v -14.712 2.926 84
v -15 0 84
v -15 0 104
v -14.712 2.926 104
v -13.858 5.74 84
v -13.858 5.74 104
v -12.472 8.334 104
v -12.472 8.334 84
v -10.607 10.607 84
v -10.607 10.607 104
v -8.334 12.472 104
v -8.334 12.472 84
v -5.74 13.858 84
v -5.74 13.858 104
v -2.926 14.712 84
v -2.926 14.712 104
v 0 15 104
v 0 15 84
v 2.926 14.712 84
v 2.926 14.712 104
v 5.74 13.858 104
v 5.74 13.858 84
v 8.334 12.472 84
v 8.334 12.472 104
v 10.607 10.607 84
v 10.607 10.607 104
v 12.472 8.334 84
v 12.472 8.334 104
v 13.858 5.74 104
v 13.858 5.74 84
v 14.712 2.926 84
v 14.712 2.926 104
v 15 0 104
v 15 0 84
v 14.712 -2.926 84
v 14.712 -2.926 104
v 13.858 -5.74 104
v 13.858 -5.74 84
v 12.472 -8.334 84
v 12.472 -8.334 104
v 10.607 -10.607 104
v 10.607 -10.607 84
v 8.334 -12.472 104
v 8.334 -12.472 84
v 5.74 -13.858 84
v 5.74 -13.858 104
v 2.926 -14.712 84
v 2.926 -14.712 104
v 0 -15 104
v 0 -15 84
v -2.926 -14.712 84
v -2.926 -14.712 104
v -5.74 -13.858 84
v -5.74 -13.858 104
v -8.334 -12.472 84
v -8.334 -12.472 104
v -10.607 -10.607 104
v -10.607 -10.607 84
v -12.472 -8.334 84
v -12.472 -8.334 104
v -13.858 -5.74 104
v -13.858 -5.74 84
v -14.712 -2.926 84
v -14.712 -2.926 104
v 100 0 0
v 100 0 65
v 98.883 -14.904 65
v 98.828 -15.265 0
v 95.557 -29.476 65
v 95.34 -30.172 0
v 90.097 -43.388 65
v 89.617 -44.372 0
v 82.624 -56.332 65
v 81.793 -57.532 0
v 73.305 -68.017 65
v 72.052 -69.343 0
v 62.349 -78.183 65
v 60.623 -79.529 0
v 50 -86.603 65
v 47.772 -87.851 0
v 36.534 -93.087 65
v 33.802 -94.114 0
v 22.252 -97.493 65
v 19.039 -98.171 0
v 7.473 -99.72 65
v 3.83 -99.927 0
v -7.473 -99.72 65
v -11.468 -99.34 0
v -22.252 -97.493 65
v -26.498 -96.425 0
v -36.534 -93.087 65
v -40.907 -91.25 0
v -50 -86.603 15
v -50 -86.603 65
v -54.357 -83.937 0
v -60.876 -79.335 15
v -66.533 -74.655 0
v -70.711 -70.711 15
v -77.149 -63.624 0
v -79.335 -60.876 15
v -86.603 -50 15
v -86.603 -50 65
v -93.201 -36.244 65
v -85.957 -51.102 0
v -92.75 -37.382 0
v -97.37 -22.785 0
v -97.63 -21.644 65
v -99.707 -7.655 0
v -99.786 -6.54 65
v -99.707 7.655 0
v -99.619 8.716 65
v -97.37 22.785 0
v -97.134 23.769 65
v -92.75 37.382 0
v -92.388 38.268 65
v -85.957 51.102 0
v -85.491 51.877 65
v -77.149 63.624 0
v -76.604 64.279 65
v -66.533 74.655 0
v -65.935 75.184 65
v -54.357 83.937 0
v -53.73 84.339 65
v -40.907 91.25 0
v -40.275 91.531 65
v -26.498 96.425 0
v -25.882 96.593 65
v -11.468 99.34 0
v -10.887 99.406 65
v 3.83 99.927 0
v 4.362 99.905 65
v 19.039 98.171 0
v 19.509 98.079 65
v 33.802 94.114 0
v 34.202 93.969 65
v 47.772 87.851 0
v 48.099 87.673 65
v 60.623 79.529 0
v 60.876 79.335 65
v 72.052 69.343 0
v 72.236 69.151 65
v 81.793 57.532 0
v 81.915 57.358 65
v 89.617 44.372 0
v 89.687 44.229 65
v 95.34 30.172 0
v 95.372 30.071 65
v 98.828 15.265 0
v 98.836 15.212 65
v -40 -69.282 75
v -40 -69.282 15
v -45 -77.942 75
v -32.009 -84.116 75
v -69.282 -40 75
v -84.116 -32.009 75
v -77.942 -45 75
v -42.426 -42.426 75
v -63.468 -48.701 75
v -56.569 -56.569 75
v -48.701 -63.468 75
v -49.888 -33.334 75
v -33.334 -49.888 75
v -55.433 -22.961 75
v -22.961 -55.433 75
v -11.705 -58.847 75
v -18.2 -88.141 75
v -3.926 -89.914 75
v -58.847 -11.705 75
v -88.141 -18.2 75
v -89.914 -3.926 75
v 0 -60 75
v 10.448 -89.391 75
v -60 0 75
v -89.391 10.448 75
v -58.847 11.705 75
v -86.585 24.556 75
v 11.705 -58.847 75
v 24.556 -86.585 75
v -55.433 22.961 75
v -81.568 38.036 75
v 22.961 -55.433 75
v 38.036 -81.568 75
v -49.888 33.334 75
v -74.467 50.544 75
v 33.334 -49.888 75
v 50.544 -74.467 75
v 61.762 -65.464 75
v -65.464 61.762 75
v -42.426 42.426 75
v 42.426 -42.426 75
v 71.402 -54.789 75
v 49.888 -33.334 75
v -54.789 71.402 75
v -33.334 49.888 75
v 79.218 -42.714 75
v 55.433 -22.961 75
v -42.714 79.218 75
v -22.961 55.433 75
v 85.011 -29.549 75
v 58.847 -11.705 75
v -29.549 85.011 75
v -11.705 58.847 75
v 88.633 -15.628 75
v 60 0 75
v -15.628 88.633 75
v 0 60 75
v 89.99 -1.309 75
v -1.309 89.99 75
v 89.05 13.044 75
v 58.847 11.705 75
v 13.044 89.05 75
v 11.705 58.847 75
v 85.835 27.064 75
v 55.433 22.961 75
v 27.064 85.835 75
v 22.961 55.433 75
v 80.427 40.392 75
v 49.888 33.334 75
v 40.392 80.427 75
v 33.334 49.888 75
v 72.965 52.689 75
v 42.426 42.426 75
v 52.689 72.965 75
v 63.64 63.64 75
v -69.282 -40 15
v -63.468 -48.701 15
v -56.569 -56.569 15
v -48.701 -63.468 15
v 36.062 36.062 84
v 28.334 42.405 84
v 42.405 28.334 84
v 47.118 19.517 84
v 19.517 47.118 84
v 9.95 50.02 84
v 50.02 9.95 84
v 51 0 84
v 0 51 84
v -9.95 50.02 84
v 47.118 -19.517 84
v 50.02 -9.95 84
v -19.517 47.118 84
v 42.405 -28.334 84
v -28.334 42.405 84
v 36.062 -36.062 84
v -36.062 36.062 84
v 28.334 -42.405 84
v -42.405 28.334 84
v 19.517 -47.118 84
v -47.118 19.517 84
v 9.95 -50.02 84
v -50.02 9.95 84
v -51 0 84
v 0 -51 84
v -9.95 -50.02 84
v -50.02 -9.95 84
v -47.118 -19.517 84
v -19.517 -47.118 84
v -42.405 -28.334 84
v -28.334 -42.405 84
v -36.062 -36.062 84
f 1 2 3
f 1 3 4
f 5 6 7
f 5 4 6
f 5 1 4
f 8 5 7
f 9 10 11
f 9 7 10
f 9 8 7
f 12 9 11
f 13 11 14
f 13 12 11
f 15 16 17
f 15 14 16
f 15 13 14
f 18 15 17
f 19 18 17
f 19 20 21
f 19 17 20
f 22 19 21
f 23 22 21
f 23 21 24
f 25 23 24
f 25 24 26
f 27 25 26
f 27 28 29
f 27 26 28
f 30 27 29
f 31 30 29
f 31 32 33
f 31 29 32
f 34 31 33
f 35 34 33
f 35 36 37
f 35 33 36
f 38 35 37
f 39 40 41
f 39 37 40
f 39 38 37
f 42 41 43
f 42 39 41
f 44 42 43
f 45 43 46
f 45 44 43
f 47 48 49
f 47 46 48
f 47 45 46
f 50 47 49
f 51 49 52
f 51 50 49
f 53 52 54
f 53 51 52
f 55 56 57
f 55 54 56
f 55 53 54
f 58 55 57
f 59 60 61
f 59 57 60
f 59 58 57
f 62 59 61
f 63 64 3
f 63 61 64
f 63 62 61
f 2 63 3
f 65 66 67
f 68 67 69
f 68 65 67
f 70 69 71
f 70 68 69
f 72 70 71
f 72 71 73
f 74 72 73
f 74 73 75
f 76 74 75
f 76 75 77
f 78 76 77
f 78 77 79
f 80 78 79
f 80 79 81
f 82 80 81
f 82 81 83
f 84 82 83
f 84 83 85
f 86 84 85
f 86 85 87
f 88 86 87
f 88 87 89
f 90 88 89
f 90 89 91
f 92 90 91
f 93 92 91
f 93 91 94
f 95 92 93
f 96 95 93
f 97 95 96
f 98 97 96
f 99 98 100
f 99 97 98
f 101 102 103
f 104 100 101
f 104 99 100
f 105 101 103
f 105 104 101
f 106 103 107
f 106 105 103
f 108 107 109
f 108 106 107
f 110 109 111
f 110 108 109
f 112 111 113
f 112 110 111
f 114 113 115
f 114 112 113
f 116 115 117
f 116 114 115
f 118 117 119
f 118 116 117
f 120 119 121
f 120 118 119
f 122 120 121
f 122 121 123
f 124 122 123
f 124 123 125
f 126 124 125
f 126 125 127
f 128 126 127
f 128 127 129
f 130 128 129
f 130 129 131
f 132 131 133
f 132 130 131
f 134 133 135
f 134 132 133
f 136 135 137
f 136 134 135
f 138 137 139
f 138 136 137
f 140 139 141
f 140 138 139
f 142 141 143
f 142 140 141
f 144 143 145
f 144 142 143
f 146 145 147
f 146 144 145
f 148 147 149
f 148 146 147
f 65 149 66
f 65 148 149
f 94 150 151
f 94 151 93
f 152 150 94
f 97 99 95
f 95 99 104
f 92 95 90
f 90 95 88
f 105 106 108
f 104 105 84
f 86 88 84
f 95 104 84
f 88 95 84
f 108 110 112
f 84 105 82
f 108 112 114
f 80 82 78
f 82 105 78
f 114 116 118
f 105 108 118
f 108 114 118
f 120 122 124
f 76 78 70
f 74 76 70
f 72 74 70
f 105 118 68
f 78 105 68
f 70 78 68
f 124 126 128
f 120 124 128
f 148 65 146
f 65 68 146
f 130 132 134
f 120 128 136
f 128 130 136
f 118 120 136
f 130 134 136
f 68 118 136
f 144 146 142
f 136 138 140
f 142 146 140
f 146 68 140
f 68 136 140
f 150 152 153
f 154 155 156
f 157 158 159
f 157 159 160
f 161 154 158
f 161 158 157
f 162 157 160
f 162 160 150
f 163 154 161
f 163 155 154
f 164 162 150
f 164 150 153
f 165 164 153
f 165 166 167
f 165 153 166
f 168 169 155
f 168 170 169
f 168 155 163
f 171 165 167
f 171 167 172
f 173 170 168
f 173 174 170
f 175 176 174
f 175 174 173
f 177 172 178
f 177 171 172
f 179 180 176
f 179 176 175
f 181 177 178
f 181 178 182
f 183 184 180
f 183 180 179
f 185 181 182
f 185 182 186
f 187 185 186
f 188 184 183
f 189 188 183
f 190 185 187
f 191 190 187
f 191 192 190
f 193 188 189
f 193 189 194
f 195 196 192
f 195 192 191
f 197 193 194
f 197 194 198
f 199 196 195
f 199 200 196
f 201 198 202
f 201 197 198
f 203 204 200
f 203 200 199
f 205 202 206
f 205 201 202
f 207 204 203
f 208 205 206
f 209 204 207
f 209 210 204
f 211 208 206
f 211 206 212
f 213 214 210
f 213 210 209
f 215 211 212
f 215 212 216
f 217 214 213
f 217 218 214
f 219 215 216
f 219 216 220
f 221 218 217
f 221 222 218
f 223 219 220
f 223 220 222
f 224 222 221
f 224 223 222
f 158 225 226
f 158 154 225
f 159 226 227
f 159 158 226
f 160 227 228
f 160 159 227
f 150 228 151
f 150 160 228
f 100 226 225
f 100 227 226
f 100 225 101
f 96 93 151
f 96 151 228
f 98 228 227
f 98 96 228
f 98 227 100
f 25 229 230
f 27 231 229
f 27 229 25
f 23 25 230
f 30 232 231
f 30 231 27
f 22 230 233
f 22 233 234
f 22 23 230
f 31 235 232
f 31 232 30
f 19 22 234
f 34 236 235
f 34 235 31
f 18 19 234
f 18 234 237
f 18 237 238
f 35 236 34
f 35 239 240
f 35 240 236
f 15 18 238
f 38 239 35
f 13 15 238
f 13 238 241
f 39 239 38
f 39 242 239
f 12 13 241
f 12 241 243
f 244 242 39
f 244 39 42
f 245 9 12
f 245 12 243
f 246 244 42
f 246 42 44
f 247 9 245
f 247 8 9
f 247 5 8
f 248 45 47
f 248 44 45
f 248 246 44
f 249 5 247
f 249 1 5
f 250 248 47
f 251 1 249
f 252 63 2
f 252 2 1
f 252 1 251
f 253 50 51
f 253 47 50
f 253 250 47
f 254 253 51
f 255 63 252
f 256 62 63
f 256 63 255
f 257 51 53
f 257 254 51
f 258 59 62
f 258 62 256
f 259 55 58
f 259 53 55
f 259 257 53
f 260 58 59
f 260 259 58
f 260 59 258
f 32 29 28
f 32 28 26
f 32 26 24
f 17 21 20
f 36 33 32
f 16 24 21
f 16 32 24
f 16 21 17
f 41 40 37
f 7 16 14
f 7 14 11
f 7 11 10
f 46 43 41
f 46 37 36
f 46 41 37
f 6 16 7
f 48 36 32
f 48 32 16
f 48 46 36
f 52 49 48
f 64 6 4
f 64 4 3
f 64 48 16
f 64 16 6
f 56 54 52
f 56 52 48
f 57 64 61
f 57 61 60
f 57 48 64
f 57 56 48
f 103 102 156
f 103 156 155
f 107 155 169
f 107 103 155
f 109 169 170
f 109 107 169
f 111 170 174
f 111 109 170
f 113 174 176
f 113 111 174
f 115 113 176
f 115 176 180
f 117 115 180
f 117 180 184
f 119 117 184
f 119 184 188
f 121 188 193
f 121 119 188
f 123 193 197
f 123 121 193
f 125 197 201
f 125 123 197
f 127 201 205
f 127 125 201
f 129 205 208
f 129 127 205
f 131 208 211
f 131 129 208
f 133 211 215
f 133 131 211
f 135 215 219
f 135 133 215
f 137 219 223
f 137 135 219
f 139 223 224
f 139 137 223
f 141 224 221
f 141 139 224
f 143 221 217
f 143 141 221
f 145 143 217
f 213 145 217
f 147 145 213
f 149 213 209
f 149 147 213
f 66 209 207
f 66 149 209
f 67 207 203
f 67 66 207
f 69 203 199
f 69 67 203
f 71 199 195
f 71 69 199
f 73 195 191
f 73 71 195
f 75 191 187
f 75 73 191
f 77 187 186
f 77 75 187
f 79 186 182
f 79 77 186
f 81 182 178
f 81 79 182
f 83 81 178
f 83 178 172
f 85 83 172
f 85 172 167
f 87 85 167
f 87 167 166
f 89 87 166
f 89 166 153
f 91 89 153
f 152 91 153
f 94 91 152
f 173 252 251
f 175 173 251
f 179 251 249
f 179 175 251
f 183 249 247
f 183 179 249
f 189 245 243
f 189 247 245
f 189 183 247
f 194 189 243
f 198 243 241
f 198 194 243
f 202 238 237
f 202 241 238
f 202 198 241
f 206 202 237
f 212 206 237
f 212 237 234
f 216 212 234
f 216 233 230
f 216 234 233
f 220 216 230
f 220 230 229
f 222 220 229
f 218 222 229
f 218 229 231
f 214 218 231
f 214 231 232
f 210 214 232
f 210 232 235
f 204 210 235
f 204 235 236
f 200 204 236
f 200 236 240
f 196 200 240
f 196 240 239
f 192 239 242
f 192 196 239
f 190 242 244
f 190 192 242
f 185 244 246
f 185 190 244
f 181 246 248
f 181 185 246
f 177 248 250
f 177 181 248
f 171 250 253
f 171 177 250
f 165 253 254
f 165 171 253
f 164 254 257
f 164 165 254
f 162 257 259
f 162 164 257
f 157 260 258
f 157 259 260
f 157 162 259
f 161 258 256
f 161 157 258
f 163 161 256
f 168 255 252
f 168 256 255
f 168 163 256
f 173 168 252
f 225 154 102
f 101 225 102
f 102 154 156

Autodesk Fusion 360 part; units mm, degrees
sketch "Sketch1" plane through (0, 0, 0) normal (0, 0, 1) x (1, 0, 0)
  circle A0 centre (0, 0) radius 100
  dimension "d1" = 200
extrude "Extrude1" add sketch "Sketch1" along normal blind 75
chamfer "Chamfer1" distance 10 angle 45 1 edges at (-93.2327, -36.1615, 75)
sketch "Sketch2" plane through (0, 0, 75) normal (0, 0, 1) x (-1, 0, 0)
  circle A0 centre (0, 0) radius 90
  circle A1 centre (0, 0) radius 100
  line L0 (0, 0) -> (0, 100)
  line L1 (0, 0) -> (100, 0)
  circle A2 centre (0, 0) radius 80
  line L2 (0, 0) -> (100, 0)
  line L3 (0, 0) -> (139.8681, 80.7529)
  line L4 (0, 0) -> (161.5058, 0) construction
  line L5 (0, 0) -> (61.5265, 106.567)
  dimension "d5" = 160
  dimension "d6" = 30
  dimension "d7" = 60
extrude "Extrude2" cut sketch "Sketch2" against normal blind 60 contours A0 A2 L3 L5 | A0 A1 L3 L5
sketch "Sketch3" plane through (0, 0, 75) normal (0, 0, 1) x (-1, 0, 0)
  line L0 (40, 69.282) -> (45, 77.9423)
  arc A0 (45, 77.9423) -> (77.9423, 45) centre (0, 0) ccw
  line L1 (77.9423, 45) -> (69.282, 40)
  arc A1 (69.282, 40) -> (40, 69.282) centre (0, 0) ccw
  circle A2 centre (0, 0) radius 60
  dimension "d11" = 120
extrude "Extrude3" add sketch "Sketch3" along normal blind 9 draft -45 contours A2
sketch "Sketch4" plane through (0, 0, 84) normal (0, 0, 1) x (-1, 0, 0)
  circle A0 centre (0, 0) radius 51
  circle A1 centre (0, 0) radius 15
  dimension "d14" = 30
extrude "Extrude4" add sketch "Sketch4" along normal blind 20 contours A1
